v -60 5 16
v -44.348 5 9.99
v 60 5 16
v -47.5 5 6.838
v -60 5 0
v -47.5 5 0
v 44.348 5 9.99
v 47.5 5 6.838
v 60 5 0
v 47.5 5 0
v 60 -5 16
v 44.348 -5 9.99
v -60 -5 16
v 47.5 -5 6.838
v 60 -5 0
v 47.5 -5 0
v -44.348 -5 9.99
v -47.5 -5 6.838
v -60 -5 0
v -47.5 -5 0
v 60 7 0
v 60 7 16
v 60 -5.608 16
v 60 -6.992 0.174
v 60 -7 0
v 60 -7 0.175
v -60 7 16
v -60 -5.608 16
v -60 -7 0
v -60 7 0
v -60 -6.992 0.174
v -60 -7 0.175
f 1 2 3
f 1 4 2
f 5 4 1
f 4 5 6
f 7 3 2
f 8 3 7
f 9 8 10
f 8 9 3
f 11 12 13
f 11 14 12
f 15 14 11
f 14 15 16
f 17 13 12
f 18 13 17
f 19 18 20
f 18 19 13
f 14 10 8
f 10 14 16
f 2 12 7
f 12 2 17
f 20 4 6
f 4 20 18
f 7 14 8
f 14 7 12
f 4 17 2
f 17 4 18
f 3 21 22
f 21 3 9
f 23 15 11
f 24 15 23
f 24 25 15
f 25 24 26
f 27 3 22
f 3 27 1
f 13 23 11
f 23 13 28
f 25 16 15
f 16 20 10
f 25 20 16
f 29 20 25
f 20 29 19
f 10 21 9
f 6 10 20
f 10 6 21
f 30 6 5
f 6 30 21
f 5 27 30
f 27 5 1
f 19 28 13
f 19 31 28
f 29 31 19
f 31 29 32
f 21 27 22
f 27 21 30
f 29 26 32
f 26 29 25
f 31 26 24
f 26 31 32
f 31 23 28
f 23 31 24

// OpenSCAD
depth=14;
height=10+6;

translate([0,-5,0]) difference() {
	translate([0, (10-depth)/2, 0]) union() {
		translate([-60,0,0]) cube([120,depth,height]);
	}
	union() {
	translate([0,0,-0.01]) difference() {
		translate([-80,0,0])      cube([160, 10, 30]);
		translate([-95/2,-10,-1]) cube([95, 30, 10+1]);
	}
	translate([ 95/2-sqrt(10),0,10]) rotate([0,45,0]) cube([10, 10, 10]);
	translate([-95/2+sqrt(10),0,10]) rotate([0,180+45,0]) cube([10, 10, 10]);
	}
	rotate([-5,0,0]) translate([-100, -10-2, 0]) cube([200, 10, 40]);
}
